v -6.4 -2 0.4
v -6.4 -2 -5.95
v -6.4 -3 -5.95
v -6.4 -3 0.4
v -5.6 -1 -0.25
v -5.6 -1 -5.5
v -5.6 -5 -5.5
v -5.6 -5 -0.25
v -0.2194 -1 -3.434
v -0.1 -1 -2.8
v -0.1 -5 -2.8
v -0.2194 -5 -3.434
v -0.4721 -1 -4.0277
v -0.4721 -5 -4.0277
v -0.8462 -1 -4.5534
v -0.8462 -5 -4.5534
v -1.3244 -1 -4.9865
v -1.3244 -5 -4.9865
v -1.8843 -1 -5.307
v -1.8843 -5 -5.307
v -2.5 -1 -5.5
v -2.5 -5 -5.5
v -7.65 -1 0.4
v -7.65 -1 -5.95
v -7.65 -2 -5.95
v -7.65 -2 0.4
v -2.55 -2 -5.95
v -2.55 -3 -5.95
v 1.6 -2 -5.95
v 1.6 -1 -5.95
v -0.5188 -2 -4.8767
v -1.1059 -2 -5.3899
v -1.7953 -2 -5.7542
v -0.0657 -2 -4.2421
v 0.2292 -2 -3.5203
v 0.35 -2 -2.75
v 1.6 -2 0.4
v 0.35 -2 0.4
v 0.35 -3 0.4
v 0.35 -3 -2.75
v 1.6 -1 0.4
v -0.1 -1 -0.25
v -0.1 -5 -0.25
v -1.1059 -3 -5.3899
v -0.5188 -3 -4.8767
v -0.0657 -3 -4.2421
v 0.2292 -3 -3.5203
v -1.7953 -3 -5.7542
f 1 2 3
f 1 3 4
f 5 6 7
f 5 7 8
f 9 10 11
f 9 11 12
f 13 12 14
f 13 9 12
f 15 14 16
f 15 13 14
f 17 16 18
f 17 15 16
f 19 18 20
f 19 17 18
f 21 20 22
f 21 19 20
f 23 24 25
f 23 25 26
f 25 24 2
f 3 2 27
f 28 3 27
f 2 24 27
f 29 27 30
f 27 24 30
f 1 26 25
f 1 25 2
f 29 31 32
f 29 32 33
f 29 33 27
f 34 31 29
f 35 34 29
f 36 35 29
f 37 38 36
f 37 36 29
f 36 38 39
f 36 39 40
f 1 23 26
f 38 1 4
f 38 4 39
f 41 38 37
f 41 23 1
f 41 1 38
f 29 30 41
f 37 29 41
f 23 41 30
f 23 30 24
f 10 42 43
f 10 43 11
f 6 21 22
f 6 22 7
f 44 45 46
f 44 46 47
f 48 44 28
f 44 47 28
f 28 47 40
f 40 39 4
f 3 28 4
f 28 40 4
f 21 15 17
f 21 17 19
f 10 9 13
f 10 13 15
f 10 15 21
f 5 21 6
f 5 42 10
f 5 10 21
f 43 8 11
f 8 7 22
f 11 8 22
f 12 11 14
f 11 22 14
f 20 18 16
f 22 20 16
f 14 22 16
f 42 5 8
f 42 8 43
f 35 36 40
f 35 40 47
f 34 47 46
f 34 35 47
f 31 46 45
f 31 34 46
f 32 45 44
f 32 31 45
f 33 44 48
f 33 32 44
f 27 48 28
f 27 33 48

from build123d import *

# Parameters (mm, degrees)
BOSS_EXTRUDE2_DEPTH     = 2
BOSS_EXTRUDE3_DEPTH     = 1
SKETCH4_W               = 9.25
SKETCH4_H               = 6.35
BOSS_EXTRUDE4_DEPTH     = 1
BOSS_EXTRUDE6_DEPTH     = 3
BOSS_EXTRUDE7_DEPTH     = 5
CUT_EXTRUDE1_DEPTH      = 1
CUT_EXTRUDE1_DEPTH_BACK = 3


with BuildPart() as part:
    # Sketch2 → Boss-Extrude2 (new body)
    with BuildSketch(Plane(origin=(0, 0, 0), x_dir=(1, 0, 0), z_dir=(0, 1, 0))):
        with BuildLine():
            Line((-2.5, 5.5), (-5.6, 5.5))
            Line((-5.6, 5.5), (-5.6, 2.8))
            Line((-5.6, 2.8), (-5.6, 0.25))
            Line((-5.6, 0.25), (-0.1, 0.25))
            Line((-0.1, 0.25), (-0.1, 2.8))
            ThreePointArc((-0.1, 2.8), (-0.846230195, 4.553350938), (-2.5, 5.5))
        make_face()
    extrude(amount=BOSS_EXTRUDE2_DEPTH)

    # Sketch3 → Boss-Extrude3 (add)
    with BuildSketch(Plane.XZ):
        with BuildLine():
            Line((-6.4, 0.4), (0.35, 0.4))
            Line((0.35, 0.4), (0.35, -2.75))
            ThreePointArc((0.35, -2.75), (-0.518832832, -4.876682746), (-2.55, -5.95))
            Line((-2.55, -5.95), (-6.4, -5.95))
            Line((-6.4, -5.95), (-6.4, 0.4))
        make_face()
    extrude(amount=BOSS_EXTRUDE3_DEPTH)

    # Sketch4 → Boss-Extrude4 (add)
    with BuildSketch(Plane.XZ.offset(1)):
        with Locations((-3.025, -2.775)):
            Rectangle(SKETCH4_W, SKETCH4_H)
    extrude(amount=BOSS_EXTRUDE4_DEPTH)

    # Sketch3<3> → Boss-Extrude6 (add)
    with BuildSketch(Plane.XZ):
        with BuildLine():
            Line((-6.4, 0.4), (0.35, 0.4))
            Line((0.35, 0.4), (0.35, -2.75))
            ThreePointArc((0.35, -2.75), (-0.518832832, -4.876682746), (-2.55, -5.95))
            Line((-2.55, -5.95), (-6.4, -5.95))
            Line((-6.4, -5.95), (-6.4, 0.4))
        make_face()
    extrude(amount=BOSS_EXTRUDE6_DEPTH)


with BuildPart() as body_2:
    # Sketch2<5> → Boss-Extrude7 (new body)
    with BuildSketch(Plane(origin=(0, 0, 0), x_dir=(1, 0, 0), z_dir=(0, 1, 0))):
        with BuildLine():
            Line((-2.5, 5.5), (-5.6, 5.5))
            Line((-5.6, 5.5), (-5.6, 2.8))
            Line((-5.6, 2.8), (-5.6, 0.25))
            Line((-5.6, 0.25), (-0.1, 0.25))
            Line((-0.1, 0.25), (-0.1, 2.8))
            ThreePointArc((-0.1, 2.8), (-0.846230195, 4.553350938), (-2.5, 5.5))
        make_face()
    extrude(amount=-BOSS_EXTRUDE7_DEPTH)


with BuildPart() as cut_extrude1_tool:
    # Sketch3<4> → Cut-Extrude1 (new, two sides: drawn at the far end of the back side and taken through both)
    with BuildSketch(Plane.XZ.offset(-CUT_EXTRUDE1_DEPTH_BACK)):
        with BuildLine():
            Line((-6.4, 0.4), (0.35, 0.4))
            Line((0.35, 0.4), (0.35, -2.75))
            ThreePointArc((0.35, -2.75), (-0.518832832, -4.876682746), (-2.55, -5.95))
            Line((-2.55, -5.95), (-6.4, -5.95))
            Line((-6.4, -5.95), (-6.4, 0.4))
        make_face()
    extrude(amount=CUT_EXTRUDE1_DEPTH + CUT_EXTRUDE1_DEPTH_BACK)


with BuildPart() as part_1:
    add(part.part)

    # Cut-Extrude1: cut by cut_extrude1_tool
    add(cut_extrude1_tool.part, mode=Mode.SUBTRACT)


with BuildPart() as body_2_1:
    add(body_2.part)

    # Cut-Extrude1: cut by cut_extrude1_tool
    add(cut_extrude1_tool.part, mode=Mode.SUBTRACT)


solid = Compound([part_1.part, body_2_1.part])
